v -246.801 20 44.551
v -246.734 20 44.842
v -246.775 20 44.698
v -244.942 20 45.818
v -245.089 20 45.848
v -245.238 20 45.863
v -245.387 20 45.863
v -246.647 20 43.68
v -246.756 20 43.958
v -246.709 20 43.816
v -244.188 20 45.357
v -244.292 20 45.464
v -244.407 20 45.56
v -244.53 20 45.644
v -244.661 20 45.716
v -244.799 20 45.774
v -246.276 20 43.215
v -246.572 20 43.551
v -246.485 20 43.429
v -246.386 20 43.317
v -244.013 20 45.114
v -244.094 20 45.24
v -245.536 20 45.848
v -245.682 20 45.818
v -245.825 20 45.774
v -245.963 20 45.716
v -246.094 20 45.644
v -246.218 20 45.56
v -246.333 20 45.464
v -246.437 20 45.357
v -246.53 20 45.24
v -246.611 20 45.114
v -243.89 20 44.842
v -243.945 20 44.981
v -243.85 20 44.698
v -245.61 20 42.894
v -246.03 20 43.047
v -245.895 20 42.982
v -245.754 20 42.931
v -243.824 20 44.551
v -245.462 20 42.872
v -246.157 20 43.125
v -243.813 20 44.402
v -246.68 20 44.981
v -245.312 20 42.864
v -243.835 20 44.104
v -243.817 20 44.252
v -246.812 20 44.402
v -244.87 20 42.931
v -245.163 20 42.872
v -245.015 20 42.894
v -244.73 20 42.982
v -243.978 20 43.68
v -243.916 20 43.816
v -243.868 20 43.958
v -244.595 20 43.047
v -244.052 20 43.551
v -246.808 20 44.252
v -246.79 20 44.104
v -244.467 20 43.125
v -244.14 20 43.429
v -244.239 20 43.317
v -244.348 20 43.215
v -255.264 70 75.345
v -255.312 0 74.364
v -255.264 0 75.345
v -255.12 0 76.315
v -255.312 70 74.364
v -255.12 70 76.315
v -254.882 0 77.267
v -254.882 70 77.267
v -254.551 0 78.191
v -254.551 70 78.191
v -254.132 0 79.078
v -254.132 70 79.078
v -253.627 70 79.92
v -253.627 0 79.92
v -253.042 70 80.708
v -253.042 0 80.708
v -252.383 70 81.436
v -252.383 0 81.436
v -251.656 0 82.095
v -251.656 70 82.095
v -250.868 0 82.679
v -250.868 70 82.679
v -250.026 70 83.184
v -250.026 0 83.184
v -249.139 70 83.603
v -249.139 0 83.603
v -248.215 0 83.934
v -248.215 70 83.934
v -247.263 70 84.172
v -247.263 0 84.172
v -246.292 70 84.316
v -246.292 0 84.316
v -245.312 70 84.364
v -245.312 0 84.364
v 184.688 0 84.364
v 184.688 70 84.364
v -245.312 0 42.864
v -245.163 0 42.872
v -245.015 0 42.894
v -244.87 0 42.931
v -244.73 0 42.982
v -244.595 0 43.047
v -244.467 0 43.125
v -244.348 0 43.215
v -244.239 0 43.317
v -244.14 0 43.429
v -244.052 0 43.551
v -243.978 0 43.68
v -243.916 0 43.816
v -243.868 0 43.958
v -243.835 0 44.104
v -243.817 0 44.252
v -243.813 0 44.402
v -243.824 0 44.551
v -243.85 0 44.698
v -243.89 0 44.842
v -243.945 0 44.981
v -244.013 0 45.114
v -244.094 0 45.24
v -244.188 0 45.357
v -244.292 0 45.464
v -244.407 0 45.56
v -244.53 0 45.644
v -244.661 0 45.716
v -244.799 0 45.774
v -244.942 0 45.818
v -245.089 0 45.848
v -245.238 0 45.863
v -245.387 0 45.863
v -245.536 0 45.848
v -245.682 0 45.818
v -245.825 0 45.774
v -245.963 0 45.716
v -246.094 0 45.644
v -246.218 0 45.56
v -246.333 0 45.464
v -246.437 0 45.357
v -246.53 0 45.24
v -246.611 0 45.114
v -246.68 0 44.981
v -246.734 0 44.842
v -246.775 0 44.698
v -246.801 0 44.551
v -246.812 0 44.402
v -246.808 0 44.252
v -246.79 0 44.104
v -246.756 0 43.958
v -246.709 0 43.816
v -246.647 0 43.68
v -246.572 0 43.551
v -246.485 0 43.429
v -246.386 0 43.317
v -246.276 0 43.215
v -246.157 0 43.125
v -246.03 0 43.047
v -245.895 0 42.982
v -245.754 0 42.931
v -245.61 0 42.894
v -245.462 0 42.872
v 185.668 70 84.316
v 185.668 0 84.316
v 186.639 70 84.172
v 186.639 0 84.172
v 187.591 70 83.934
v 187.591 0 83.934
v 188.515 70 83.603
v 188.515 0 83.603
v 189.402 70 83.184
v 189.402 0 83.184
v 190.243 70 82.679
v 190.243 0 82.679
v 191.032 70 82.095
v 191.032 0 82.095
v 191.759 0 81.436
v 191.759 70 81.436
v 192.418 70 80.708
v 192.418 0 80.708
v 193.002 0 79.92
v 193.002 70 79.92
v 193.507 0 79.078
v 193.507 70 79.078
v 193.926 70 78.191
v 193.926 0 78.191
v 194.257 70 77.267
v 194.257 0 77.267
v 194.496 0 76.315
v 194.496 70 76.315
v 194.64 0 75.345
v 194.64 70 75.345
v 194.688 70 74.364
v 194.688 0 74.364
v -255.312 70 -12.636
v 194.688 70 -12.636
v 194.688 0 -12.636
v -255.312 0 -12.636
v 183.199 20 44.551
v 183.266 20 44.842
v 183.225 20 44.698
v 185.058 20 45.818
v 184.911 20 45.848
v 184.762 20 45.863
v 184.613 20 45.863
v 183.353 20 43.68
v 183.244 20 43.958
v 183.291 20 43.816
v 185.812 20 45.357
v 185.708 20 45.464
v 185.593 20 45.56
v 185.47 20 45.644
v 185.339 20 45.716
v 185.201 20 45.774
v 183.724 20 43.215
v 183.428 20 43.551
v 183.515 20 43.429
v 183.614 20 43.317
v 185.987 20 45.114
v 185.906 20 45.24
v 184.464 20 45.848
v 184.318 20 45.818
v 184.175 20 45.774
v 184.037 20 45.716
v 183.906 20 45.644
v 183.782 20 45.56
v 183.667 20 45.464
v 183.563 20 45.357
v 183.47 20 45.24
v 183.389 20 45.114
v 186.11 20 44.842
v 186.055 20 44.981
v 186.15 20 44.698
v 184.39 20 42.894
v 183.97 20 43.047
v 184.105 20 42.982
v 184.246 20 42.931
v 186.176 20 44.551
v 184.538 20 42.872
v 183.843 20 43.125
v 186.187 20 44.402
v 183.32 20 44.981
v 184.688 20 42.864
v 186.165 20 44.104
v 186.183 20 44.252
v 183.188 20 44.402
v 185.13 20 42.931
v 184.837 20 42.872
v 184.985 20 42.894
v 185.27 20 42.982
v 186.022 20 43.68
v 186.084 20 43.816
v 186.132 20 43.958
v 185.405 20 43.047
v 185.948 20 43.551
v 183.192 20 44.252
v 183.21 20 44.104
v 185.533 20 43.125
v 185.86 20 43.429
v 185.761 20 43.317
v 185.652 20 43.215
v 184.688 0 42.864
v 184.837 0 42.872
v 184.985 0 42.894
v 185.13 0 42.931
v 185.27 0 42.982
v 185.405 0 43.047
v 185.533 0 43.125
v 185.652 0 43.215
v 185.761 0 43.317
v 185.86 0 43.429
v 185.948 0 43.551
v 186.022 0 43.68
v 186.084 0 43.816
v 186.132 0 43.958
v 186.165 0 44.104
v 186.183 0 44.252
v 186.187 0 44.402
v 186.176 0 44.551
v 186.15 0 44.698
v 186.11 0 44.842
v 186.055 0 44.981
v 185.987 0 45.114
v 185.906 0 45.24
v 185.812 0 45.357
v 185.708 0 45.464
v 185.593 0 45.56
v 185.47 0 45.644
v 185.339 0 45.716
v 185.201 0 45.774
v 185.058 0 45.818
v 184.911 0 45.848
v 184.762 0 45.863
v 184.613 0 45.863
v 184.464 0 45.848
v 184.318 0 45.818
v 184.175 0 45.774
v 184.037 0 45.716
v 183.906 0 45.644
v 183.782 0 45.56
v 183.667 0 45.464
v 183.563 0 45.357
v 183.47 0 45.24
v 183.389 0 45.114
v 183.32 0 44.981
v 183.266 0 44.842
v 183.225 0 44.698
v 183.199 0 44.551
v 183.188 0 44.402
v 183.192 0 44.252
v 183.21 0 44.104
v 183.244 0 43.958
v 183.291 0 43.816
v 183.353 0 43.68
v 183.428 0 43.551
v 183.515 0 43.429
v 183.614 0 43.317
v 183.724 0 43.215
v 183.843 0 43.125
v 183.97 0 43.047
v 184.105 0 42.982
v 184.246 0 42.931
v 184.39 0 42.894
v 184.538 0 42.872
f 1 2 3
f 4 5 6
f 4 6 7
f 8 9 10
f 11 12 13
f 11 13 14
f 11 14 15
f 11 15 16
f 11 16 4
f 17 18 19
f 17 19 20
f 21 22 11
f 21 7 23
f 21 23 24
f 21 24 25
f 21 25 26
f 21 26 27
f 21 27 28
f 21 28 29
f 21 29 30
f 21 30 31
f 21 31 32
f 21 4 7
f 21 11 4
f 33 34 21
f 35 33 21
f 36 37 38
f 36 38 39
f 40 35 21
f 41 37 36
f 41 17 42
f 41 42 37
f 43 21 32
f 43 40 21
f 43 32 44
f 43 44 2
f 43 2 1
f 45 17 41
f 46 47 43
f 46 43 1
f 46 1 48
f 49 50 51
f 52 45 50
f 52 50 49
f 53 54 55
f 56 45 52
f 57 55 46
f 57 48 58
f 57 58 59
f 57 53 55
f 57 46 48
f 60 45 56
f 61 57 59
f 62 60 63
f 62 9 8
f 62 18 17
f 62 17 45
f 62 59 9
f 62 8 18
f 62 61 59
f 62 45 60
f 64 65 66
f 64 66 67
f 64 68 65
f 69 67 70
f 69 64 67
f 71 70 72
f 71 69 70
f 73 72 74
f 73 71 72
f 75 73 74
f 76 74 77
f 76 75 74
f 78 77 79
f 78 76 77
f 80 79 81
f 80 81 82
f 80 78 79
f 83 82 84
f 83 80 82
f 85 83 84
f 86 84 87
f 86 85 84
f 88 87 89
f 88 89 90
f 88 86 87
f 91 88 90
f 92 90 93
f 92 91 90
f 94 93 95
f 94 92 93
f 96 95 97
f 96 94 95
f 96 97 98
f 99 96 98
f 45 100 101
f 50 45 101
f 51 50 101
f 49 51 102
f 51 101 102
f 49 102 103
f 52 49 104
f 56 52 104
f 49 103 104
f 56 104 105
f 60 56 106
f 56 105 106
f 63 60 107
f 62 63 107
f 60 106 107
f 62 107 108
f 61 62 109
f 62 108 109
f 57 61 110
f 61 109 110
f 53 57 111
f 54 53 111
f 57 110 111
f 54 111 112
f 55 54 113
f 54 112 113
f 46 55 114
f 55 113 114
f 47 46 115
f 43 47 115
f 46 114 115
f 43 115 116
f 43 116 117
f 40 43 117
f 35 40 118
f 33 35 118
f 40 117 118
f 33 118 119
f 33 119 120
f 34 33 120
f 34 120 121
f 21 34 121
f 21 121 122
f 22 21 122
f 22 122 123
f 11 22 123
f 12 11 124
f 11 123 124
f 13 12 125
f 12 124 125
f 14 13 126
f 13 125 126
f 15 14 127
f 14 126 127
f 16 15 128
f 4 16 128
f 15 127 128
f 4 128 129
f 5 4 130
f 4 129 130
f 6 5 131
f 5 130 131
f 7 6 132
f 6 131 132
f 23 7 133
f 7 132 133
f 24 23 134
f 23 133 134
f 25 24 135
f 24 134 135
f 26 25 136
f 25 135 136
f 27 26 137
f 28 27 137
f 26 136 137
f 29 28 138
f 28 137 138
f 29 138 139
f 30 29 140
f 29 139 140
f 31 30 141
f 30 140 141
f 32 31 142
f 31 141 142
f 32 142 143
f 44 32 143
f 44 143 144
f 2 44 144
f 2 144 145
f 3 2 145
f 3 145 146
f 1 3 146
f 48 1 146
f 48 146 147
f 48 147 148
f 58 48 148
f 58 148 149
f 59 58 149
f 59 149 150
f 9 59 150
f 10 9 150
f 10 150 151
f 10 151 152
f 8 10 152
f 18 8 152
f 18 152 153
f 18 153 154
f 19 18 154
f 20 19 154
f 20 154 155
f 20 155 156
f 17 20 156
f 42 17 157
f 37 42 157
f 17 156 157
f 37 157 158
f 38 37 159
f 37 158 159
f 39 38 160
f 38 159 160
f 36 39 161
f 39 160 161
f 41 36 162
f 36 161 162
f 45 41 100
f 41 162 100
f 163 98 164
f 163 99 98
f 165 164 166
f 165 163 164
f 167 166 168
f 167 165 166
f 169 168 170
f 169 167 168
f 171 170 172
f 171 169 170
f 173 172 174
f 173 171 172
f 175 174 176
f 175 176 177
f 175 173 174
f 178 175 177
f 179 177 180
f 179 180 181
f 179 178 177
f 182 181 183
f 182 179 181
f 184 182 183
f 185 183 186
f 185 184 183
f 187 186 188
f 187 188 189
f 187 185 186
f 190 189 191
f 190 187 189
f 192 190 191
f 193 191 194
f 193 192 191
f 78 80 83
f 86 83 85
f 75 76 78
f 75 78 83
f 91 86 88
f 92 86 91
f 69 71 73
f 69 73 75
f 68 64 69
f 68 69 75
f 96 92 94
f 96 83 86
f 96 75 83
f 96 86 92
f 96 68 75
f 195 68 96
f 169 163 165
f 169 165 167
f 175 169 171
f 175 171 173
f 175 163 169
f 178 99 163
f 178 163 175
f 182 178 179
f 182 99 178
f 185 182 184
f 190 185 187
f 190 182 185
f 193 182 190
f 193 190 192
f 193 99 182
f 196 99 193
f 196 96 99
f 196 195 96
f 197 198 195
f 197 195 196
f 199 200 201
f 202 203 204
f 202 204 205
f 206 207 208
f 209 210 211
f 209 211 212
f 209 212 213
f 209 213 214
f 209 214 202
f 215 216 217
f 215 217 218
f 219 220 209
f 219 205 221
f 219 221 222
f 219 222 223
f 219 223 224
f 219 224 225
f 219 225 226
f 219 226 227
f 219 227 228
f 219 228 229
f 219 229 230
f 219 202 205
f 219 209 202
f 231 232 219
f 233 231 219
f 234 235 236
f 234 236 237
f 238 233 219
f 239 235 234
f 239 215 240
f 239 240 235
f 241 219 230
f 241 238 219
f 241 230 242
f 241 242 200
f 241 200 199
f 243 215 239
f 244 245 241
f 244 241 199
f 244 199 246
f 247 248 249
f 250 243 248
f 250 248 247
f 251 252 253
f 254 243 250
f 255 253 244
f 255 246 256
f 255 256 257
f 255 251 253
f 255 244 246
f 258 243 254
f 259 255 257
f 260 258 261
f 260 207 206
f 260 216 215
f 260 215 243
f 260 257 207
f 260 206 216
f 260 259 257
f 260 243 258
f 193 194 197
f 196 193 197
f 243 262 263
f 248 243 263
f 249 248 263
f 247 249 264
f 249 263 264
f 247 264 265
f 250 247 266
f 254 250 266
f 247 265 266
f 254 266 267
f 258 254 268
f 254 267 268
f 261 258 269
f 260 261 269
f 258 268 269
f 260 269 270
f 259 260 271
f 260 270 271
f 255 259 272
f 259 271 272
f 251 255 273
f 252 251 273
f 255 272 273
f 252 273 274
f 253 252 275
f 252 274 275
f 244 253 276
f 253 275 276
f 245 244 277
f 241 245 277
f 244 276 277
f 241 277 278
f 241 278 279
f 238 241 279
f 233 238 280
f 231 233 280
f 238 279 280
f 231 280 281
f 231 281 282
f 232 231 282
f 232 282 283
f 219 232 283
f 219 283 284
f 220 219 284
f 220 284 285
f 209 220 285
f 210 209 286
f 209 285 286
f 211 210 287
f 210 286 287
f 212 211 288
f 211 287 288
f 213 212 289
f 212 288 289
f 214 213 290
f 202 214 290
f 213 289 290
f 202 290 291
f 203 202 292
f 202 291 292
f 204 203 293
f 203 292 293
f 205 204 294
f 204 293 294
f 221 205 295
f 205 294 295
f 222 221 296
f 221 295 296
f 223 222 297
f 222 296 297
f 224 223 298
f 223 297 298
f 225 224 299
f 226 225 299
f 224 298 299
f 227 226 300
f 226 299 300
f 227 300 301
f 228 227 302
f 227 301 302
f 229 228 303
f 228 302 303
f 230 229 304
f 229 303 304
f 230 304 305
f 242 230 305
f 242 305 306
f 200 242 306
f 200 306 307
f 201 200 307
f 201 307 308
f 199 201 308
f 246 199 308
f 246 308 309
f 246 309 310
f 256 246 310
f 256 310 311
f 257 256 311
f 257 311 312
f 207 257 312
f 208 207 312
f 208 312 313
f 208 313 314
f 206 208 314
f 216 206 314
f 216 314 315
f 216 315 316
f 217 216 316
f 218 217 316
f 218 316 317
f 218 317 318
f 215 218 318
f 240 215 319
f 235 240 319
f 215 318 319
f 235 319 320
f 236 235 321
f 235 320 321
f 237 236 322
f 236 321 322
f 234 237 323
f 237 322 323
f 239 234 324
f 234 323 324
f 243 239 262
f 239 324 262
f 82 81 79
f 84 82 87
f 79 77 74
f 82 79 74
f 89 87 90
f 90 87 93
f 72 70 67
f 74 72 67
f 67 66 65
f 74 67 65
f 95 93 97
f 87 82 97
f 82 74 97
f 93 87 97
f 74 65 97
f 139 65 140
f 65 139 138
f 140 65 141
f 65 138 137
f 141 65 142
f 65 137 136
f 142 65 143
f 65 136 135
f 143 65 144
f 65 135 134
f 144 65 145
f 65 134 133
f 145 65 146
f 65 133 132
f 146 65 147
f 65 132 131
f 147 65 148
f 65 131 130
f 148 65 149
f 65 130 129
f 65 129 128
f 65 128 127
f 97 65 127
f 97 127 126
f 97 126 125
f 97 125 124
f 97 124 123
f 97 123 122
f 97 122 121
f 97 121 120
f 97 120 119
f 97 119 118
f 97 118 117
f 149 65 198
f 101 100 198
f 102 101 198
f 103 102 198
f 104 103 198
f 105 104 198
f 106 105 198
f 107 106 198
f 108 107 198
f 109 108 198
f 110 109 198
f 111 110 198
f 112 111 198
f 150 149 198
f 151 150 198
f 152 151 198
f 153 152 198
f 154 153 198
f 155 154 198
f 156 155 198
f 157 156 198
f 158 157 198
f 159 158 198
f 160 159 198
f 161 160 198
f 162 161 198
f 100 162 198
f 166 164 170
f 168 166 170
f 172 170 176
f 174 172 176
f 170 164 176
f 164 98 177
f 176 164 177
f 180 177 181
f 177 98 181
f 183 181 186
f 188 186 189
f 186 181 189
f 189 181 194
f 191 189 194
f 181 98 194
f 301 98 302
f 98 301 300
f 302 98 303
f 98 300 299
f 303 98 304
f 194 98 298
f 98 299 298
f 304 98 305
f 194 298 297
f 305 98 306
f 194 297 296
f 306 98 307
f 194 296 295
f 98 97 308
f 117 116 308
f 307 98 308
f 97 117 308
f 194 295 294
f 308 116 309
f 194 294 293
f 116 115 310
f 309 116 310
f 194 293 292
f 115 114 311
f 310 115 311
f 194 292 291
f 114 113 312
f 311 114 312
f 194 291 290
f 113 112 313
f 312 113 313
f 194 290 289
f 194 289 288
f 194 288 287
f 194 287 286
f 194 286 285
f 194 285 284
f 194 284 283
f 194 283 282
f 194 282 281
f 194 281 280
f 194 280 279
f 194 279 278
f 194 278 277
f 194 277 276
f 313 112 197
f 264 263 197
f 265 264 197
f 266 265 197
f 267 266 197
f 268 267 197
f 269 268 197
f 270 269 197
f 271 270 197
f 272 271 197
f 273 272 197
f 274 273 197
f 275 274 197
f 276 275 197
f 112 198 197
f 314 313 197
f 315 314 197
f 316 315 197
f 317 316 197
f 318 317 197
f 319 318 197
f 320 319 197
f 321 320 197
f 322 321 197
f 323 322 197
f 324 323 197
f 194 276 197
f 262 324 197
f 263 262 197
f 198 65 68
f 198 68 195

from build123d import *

# Parameters (mm, degrees)
SKETCH1_W           = 450
SKETCH1_H           = 97
BOSS_EXTRUDE1_DEPTH = 70
FILLET1_R           = 10
SKETCH2_R           = 1.5
CUT_EXTRUDE1_DEPTH  = 20


with BuildPart() as part:
    # Sketch1 → Boss-Extrude1 (new body)
    with BuildSketch(Plane(origin=(0, 0, 0), x_dir=(1, 0, 0), z_dir=(0, 1, 0))):
        with Locations((-30.312317216, -35.86444631)):
            Rectangle(SKETCH1_W, SKETCH1_H)
    extrude(amount=BOSS_EXTRUDE1_DEPTH)

    # Fillet1
    fillet1_edges = [part.edges().sort_by_distance(p)[0] for p in [
        (194.687682784, 35, 84.36444631),
        (-255.312317216, 35, 84.36444631),
    ]]
    fillet(fillet1_edges, radius=FILLET1_R)

    # Sketch2 → Cut-Extrude1 (cut)
    with BuildSketch(Plane(origin=(0, 0, 0), x_dir=(-1, 0, 0), z_dir=(0, -1, 0))):
        with Locations(Location((-184.687682784, -44.36444631, 0), (0, 0, 90))):
            Circle(SKETCH2_R)
        with Locations(Location((245.312317216, -44.36444631, 0), (0, 0, 90))):
            Circle(SKETCH2_R)
    extrude(amount=-CUT_EXTRUDE1_DEPTH, mode=Mode.SUBTRACT)


solid = part.part
